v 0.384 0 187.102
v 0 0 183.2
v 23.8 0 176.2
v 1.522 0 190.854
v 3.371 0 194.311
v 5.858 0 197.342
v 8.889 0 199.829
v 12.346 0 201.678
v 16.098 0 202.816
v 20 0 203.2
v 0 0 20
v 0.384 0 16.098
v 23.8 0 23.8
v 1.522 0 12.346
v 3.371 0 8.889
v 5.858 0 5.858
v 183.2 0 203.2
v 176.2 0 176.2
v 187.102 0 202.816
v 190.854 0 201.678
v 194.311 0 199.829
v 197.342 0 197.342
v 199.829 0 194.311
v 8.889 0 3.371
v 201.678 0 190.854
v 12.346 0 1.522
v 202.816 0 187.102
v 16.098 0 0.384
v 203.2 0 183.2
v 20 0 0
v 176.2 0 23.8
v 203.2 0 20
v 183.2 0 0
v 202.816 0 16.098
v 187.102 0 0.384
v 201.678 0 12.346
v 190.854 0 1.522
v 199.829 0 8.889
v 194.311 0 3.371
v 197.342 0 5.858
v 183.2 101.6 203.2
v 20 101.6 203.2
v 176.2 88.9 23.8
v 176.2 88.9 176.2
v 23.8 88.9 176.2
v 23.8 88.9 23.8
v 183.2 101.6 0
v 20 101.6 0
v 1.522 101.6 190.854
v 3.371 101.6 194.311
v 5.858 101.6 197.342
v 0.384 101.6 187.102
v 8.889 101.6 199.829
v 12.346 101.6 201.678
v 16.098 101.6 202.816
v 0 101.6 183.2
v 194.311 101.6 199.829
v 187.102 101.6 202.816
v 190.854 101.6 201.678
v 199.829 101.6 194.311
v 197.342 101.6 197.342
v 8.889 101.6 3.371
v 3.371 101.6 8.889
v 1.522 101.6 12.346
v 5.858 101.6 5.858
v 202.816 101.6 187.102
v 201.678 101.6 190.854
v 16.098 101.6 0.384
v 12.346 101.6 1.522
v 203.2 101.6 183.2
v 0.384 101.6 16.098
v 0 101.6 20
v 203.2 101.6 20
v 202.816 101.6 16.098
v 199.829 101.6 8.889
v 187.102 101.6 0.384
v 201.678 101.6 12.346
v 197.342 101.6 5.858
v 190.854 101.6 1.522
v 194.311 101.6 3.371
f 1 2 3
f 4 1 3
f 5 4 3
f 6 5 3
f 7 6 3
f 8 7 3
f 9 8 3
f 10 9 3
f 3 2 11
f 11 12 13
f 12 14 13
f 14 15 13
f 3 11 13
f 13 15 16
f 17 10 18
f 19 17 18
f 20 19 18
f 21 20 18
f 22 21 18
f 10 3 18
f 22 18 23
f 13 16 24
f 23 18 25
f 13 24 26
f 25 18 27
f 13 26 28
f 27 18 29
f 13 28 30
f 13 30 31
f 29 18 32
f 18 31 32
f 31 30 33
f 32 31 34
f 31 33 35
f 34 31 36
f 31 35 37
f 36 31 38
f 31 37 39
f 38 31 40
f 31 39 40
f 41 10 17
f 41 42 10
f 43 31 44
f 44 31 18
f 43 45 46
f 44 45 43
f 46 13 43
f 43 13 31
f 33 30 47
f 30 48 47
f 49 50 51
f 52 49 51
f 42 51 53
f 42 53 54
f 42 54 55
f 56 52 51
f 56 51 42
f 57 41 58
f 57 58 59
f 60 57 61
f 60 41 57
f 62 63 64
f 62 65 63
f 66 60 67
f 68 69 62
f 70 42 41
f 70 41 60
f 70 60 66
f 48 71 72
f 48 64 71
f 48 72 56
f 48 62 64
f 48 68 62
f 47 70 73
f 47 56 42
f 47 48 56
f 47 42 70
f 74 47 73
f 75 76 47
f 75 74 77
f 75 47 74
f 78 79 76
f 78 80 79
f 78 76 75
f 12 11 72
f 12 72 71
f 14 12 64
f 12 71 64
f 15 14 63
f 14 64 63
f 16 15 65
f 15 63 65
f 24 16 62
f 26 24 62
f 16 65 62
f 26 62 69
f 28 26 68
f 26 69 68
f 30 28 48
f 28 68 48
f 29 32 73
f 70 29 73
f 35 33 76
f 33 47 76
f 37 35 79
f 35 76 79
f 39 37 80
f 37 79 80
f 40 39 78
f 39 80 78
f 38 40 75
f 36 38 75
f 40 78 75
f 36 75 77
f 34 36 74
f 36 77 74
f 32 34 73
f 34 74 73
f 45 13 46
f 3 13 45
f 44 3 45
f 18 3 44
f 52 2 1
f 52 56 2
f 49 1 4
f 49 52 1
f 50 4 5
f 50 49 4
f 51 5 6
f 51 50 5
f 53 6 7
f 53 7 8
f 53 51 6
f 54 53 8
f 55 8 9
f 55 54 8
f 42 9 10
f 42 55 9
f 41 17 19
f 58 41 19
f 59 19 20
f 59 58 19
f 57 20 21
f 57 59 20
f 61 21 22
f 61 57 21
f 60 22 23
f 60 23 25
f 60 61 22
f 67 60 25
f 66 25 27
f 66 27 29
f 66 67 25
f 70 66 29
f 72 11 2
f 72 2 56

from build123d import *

# Parameters (mm, degrees)
SKETCH1_W           = 203.2
SKETCH1_H           = 101.6
BOSS_EXTRUDE2_DEPTH = 203.2
FILLET3_R           = 20
FILLET4_R           = 20
FILLET5_R           = 20
FILLET6_R           = 20
SKETCH2_W           = 152.4
SKETCH2_H           = 152.4
CUT_EXTRUDE1_DEPTH  = 88.9


with BuildPart() as part:
    # Sketch1 → Boss-Extrude2 (new body)
    with BuildSketch(Plane.XY):
        with Locations((101.6, 50.8)):
            Rectangle(SKETCH1_W, SKETCH1_H)
    extrude(amount=BOSS_EXTRUDE2_DEPTH)

    # Fillet3
    fillet3_edges = [part.edges().sort_by_distance(p)[0] for p in [
        (0, 50.8, 0),
    ]]
    fillet(fillet3_edges, radius=FILLET3_R)

    # Fillet4
    fillet4_edges = [part.edges().sort_by_distance(p)[0] for p in [
        (203.2, 50.8, 0),
    ]]
    fillet(fillet4_edges, radius=FILLET4_R)

    # Fillet5
    fillet5_edges = [part.edges().sort_by_distance(p)[0] for p in [
        (0, 50.8, 203.2),
    ]]
    fillet(fillet5_edges, radius=FILLET5_R)

    # Fillet6
    fillet6_edges = [part.edges().sort_by_distance(p)[0] for p in [
        (203.2, 50.8, 203.2),
    ]]
    fillet(fillet6_edges, radius=FILLET6_R)

    # Sketch2 → Cut-Extrude1 (cut)
    with BuildSketch(Plane.XZ):
        with Locations((100, 100)):
            Rectangle(SKETCH2_W, SKETCH2_H)
    extrude(amount=-CUT_EXTRUDE1_DEPTH, mode=Mode.SUBTRACT)


solid = part.part
